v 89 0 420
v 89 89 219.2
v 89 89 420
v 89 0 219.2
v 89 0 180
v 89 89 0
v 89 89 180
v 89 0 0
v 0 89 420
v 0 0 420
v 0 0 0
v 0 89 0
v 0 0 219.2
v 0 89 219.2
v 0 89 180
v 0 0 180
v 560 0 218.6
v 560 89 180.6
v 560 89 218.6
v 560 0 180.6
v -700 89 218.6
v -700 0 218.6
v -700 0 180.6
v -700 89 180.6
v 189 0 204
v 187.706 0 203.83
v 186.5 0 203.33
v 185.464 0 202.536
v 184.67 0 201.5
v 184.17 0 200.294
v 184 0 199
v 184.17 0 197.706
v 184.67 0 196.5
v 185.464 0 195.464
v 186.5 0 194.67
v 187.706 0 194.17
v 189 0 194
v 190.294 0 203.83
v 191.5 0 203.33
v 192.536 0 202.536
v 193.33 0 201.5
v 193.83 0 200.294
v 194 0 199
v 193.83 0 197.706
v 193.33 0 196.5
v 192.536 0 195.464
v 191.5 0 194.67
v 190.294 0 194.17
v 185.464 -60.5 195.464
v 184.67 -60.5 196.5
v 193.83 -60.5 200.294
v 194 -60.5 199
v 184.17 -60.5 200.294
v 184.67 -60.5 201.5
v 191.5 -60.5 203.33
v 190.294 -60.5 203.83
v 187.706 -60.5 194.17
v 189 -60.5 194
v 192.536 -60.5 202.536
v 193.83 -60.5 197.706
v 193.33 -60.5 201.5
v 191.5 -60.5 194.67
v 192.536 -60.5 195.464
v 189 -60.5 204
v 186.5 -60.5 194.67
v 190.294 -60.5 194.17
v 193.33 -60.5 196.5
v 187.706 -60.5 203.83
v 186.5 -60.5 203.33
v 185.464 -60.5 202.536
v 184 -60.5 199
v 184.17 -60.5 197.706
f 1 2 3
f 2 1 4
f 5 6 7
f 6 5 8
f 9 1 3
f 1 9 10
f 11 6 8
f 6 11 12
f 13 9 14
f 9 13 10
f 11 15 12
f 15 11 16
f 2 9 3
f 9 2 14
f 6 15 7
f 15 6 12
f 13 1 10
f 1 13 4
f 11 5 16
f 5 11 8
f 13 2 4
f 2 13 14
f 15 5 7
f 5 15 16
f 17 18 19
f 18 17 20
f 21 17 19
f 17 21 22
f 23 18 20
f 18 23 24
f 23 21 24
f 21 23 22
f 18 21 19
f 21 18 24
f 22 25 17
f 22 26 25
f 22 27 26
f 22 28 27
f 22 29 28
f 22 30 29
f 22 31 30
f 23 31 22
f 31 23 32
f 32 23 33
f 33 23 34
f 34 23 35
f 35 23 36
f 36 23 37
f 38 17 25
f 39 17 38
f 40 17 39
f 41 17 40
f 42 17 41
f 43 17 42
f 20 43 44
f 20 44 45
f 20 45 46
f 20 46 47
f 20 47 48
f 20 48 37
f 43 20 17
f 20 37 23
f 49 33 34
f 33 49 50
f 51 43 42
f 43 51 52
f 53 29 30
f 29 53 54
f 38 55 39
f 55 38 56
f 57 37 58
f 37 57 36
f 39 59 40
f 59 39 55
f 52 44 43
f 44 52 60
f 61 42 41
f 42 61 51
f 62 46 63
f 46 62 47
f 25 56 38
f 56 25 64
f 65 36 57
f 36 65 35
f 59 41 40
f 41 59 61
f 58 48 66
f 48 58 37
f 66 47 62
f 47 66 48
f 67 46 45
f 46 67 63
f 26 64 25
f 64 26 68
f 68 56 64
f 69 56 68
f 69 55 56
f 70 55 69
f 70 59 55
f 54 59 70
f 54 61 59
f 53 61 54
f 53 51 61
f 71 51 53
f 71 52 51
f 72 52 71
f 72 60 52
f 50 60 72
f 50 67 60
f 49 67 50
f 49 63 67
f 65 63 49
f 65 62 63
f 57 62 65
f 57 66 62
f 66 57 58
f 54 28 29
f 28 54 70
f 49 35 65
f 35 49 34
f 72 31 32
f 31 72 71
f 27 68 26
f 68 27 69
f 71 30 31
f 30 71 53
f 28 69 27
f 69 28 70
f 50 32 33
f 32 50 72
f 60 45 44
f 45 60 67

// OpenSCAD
// file: hashira_lib.scad
// HASHIRA — shared dimensions (mm)
// Tunable via -D on the command line / OpenSCAD MCP variables

post_w = 89;          // ~3.5" nominal 4x4
post_d = 89;
post_h = 1800;        // above-grade height shown
rail_w = 89;          // rail width (through post face)
rail_t = 38;          // rail thickness
rail_len = 1800;      // bay center-to-center approx
bay_cc = 1800;        // post center spacing
cap_overhang = 18;
cap_h = 28;

// rail elevations from post bottom (above grade in model)
rail_z_low = 200;
rail_z_mid = 900;
rail_z_top = 1500;

ease = 1.2;           // seasonal mortise ease
peg_d = 10;
wood_post = [0.55, 0.35, 0.18];
wood_rail = [0.42, 0.52, 0.34];
wood_peg  = [0.72, 0.62, 0.42];

module hashira_post(h=post_h, w=post_w, d=post_d) {
  color(wood_post) cube([w, d, h], center=false);
}

module hashira_cap(w=post_w, d=post_d, oh=cap_overhang, h=cap_h) {
  color([0.88, 0.85, 0.78])
  translate([-oh, -oh, 0])
    linear_extrude(height=h, scale=0.72)
      square([w + 2*oh, d + 2*oh], center=false);
}

module nuki_rail(len=rail_len, w=rail_w, t=rail_t) {
  color(wood_rail) cube([len, w, t], center=false);
}

module peg(h=post_d + 20, d=peg_d) {
  color(wood_peg) cylinder(h=h, d=d, $fn=24);
}
// main file
// Nuki 貫 — through-rail joint (exploded + assembled toggle)
include <hashira_lib.scad>

exploded = 1; // 1 = exploded teaching view, 0 = assembled
explode_gap = 70;

module nuki_assembly() {
  // post with through mortise
  difference() {
    hashira_post(h=420, w=post_w, d=post_d);
    translate([-1, (post_d - rail_w)/2 - ease/2, 180])
      cube([post_w + 2, rail_w + ease, rail_t + ease]);
  }

  // through rail
  translate([
    exploded ? -rail_len*0.35 - explode_gap : -rail_len*0.35,
    (post_d - rail_w)/2,
    180 + ease/2
  ]) nuki_rail(len=rail_len*0.7);

  // wedges / pegs
  if (!exploded) {
    translate([post_w + 8, post_d/2, 180 + rail_t/2])
      rotate([90,0,0]) peg(h=post_d + 16);
  } else {
    translate([post_w + explode_gap + 30, post_d/2, 180 + rail_t/2])
      rotate([90,0,0]) peg(h=post_d + 16);
  }
}

nuki_assembly();
